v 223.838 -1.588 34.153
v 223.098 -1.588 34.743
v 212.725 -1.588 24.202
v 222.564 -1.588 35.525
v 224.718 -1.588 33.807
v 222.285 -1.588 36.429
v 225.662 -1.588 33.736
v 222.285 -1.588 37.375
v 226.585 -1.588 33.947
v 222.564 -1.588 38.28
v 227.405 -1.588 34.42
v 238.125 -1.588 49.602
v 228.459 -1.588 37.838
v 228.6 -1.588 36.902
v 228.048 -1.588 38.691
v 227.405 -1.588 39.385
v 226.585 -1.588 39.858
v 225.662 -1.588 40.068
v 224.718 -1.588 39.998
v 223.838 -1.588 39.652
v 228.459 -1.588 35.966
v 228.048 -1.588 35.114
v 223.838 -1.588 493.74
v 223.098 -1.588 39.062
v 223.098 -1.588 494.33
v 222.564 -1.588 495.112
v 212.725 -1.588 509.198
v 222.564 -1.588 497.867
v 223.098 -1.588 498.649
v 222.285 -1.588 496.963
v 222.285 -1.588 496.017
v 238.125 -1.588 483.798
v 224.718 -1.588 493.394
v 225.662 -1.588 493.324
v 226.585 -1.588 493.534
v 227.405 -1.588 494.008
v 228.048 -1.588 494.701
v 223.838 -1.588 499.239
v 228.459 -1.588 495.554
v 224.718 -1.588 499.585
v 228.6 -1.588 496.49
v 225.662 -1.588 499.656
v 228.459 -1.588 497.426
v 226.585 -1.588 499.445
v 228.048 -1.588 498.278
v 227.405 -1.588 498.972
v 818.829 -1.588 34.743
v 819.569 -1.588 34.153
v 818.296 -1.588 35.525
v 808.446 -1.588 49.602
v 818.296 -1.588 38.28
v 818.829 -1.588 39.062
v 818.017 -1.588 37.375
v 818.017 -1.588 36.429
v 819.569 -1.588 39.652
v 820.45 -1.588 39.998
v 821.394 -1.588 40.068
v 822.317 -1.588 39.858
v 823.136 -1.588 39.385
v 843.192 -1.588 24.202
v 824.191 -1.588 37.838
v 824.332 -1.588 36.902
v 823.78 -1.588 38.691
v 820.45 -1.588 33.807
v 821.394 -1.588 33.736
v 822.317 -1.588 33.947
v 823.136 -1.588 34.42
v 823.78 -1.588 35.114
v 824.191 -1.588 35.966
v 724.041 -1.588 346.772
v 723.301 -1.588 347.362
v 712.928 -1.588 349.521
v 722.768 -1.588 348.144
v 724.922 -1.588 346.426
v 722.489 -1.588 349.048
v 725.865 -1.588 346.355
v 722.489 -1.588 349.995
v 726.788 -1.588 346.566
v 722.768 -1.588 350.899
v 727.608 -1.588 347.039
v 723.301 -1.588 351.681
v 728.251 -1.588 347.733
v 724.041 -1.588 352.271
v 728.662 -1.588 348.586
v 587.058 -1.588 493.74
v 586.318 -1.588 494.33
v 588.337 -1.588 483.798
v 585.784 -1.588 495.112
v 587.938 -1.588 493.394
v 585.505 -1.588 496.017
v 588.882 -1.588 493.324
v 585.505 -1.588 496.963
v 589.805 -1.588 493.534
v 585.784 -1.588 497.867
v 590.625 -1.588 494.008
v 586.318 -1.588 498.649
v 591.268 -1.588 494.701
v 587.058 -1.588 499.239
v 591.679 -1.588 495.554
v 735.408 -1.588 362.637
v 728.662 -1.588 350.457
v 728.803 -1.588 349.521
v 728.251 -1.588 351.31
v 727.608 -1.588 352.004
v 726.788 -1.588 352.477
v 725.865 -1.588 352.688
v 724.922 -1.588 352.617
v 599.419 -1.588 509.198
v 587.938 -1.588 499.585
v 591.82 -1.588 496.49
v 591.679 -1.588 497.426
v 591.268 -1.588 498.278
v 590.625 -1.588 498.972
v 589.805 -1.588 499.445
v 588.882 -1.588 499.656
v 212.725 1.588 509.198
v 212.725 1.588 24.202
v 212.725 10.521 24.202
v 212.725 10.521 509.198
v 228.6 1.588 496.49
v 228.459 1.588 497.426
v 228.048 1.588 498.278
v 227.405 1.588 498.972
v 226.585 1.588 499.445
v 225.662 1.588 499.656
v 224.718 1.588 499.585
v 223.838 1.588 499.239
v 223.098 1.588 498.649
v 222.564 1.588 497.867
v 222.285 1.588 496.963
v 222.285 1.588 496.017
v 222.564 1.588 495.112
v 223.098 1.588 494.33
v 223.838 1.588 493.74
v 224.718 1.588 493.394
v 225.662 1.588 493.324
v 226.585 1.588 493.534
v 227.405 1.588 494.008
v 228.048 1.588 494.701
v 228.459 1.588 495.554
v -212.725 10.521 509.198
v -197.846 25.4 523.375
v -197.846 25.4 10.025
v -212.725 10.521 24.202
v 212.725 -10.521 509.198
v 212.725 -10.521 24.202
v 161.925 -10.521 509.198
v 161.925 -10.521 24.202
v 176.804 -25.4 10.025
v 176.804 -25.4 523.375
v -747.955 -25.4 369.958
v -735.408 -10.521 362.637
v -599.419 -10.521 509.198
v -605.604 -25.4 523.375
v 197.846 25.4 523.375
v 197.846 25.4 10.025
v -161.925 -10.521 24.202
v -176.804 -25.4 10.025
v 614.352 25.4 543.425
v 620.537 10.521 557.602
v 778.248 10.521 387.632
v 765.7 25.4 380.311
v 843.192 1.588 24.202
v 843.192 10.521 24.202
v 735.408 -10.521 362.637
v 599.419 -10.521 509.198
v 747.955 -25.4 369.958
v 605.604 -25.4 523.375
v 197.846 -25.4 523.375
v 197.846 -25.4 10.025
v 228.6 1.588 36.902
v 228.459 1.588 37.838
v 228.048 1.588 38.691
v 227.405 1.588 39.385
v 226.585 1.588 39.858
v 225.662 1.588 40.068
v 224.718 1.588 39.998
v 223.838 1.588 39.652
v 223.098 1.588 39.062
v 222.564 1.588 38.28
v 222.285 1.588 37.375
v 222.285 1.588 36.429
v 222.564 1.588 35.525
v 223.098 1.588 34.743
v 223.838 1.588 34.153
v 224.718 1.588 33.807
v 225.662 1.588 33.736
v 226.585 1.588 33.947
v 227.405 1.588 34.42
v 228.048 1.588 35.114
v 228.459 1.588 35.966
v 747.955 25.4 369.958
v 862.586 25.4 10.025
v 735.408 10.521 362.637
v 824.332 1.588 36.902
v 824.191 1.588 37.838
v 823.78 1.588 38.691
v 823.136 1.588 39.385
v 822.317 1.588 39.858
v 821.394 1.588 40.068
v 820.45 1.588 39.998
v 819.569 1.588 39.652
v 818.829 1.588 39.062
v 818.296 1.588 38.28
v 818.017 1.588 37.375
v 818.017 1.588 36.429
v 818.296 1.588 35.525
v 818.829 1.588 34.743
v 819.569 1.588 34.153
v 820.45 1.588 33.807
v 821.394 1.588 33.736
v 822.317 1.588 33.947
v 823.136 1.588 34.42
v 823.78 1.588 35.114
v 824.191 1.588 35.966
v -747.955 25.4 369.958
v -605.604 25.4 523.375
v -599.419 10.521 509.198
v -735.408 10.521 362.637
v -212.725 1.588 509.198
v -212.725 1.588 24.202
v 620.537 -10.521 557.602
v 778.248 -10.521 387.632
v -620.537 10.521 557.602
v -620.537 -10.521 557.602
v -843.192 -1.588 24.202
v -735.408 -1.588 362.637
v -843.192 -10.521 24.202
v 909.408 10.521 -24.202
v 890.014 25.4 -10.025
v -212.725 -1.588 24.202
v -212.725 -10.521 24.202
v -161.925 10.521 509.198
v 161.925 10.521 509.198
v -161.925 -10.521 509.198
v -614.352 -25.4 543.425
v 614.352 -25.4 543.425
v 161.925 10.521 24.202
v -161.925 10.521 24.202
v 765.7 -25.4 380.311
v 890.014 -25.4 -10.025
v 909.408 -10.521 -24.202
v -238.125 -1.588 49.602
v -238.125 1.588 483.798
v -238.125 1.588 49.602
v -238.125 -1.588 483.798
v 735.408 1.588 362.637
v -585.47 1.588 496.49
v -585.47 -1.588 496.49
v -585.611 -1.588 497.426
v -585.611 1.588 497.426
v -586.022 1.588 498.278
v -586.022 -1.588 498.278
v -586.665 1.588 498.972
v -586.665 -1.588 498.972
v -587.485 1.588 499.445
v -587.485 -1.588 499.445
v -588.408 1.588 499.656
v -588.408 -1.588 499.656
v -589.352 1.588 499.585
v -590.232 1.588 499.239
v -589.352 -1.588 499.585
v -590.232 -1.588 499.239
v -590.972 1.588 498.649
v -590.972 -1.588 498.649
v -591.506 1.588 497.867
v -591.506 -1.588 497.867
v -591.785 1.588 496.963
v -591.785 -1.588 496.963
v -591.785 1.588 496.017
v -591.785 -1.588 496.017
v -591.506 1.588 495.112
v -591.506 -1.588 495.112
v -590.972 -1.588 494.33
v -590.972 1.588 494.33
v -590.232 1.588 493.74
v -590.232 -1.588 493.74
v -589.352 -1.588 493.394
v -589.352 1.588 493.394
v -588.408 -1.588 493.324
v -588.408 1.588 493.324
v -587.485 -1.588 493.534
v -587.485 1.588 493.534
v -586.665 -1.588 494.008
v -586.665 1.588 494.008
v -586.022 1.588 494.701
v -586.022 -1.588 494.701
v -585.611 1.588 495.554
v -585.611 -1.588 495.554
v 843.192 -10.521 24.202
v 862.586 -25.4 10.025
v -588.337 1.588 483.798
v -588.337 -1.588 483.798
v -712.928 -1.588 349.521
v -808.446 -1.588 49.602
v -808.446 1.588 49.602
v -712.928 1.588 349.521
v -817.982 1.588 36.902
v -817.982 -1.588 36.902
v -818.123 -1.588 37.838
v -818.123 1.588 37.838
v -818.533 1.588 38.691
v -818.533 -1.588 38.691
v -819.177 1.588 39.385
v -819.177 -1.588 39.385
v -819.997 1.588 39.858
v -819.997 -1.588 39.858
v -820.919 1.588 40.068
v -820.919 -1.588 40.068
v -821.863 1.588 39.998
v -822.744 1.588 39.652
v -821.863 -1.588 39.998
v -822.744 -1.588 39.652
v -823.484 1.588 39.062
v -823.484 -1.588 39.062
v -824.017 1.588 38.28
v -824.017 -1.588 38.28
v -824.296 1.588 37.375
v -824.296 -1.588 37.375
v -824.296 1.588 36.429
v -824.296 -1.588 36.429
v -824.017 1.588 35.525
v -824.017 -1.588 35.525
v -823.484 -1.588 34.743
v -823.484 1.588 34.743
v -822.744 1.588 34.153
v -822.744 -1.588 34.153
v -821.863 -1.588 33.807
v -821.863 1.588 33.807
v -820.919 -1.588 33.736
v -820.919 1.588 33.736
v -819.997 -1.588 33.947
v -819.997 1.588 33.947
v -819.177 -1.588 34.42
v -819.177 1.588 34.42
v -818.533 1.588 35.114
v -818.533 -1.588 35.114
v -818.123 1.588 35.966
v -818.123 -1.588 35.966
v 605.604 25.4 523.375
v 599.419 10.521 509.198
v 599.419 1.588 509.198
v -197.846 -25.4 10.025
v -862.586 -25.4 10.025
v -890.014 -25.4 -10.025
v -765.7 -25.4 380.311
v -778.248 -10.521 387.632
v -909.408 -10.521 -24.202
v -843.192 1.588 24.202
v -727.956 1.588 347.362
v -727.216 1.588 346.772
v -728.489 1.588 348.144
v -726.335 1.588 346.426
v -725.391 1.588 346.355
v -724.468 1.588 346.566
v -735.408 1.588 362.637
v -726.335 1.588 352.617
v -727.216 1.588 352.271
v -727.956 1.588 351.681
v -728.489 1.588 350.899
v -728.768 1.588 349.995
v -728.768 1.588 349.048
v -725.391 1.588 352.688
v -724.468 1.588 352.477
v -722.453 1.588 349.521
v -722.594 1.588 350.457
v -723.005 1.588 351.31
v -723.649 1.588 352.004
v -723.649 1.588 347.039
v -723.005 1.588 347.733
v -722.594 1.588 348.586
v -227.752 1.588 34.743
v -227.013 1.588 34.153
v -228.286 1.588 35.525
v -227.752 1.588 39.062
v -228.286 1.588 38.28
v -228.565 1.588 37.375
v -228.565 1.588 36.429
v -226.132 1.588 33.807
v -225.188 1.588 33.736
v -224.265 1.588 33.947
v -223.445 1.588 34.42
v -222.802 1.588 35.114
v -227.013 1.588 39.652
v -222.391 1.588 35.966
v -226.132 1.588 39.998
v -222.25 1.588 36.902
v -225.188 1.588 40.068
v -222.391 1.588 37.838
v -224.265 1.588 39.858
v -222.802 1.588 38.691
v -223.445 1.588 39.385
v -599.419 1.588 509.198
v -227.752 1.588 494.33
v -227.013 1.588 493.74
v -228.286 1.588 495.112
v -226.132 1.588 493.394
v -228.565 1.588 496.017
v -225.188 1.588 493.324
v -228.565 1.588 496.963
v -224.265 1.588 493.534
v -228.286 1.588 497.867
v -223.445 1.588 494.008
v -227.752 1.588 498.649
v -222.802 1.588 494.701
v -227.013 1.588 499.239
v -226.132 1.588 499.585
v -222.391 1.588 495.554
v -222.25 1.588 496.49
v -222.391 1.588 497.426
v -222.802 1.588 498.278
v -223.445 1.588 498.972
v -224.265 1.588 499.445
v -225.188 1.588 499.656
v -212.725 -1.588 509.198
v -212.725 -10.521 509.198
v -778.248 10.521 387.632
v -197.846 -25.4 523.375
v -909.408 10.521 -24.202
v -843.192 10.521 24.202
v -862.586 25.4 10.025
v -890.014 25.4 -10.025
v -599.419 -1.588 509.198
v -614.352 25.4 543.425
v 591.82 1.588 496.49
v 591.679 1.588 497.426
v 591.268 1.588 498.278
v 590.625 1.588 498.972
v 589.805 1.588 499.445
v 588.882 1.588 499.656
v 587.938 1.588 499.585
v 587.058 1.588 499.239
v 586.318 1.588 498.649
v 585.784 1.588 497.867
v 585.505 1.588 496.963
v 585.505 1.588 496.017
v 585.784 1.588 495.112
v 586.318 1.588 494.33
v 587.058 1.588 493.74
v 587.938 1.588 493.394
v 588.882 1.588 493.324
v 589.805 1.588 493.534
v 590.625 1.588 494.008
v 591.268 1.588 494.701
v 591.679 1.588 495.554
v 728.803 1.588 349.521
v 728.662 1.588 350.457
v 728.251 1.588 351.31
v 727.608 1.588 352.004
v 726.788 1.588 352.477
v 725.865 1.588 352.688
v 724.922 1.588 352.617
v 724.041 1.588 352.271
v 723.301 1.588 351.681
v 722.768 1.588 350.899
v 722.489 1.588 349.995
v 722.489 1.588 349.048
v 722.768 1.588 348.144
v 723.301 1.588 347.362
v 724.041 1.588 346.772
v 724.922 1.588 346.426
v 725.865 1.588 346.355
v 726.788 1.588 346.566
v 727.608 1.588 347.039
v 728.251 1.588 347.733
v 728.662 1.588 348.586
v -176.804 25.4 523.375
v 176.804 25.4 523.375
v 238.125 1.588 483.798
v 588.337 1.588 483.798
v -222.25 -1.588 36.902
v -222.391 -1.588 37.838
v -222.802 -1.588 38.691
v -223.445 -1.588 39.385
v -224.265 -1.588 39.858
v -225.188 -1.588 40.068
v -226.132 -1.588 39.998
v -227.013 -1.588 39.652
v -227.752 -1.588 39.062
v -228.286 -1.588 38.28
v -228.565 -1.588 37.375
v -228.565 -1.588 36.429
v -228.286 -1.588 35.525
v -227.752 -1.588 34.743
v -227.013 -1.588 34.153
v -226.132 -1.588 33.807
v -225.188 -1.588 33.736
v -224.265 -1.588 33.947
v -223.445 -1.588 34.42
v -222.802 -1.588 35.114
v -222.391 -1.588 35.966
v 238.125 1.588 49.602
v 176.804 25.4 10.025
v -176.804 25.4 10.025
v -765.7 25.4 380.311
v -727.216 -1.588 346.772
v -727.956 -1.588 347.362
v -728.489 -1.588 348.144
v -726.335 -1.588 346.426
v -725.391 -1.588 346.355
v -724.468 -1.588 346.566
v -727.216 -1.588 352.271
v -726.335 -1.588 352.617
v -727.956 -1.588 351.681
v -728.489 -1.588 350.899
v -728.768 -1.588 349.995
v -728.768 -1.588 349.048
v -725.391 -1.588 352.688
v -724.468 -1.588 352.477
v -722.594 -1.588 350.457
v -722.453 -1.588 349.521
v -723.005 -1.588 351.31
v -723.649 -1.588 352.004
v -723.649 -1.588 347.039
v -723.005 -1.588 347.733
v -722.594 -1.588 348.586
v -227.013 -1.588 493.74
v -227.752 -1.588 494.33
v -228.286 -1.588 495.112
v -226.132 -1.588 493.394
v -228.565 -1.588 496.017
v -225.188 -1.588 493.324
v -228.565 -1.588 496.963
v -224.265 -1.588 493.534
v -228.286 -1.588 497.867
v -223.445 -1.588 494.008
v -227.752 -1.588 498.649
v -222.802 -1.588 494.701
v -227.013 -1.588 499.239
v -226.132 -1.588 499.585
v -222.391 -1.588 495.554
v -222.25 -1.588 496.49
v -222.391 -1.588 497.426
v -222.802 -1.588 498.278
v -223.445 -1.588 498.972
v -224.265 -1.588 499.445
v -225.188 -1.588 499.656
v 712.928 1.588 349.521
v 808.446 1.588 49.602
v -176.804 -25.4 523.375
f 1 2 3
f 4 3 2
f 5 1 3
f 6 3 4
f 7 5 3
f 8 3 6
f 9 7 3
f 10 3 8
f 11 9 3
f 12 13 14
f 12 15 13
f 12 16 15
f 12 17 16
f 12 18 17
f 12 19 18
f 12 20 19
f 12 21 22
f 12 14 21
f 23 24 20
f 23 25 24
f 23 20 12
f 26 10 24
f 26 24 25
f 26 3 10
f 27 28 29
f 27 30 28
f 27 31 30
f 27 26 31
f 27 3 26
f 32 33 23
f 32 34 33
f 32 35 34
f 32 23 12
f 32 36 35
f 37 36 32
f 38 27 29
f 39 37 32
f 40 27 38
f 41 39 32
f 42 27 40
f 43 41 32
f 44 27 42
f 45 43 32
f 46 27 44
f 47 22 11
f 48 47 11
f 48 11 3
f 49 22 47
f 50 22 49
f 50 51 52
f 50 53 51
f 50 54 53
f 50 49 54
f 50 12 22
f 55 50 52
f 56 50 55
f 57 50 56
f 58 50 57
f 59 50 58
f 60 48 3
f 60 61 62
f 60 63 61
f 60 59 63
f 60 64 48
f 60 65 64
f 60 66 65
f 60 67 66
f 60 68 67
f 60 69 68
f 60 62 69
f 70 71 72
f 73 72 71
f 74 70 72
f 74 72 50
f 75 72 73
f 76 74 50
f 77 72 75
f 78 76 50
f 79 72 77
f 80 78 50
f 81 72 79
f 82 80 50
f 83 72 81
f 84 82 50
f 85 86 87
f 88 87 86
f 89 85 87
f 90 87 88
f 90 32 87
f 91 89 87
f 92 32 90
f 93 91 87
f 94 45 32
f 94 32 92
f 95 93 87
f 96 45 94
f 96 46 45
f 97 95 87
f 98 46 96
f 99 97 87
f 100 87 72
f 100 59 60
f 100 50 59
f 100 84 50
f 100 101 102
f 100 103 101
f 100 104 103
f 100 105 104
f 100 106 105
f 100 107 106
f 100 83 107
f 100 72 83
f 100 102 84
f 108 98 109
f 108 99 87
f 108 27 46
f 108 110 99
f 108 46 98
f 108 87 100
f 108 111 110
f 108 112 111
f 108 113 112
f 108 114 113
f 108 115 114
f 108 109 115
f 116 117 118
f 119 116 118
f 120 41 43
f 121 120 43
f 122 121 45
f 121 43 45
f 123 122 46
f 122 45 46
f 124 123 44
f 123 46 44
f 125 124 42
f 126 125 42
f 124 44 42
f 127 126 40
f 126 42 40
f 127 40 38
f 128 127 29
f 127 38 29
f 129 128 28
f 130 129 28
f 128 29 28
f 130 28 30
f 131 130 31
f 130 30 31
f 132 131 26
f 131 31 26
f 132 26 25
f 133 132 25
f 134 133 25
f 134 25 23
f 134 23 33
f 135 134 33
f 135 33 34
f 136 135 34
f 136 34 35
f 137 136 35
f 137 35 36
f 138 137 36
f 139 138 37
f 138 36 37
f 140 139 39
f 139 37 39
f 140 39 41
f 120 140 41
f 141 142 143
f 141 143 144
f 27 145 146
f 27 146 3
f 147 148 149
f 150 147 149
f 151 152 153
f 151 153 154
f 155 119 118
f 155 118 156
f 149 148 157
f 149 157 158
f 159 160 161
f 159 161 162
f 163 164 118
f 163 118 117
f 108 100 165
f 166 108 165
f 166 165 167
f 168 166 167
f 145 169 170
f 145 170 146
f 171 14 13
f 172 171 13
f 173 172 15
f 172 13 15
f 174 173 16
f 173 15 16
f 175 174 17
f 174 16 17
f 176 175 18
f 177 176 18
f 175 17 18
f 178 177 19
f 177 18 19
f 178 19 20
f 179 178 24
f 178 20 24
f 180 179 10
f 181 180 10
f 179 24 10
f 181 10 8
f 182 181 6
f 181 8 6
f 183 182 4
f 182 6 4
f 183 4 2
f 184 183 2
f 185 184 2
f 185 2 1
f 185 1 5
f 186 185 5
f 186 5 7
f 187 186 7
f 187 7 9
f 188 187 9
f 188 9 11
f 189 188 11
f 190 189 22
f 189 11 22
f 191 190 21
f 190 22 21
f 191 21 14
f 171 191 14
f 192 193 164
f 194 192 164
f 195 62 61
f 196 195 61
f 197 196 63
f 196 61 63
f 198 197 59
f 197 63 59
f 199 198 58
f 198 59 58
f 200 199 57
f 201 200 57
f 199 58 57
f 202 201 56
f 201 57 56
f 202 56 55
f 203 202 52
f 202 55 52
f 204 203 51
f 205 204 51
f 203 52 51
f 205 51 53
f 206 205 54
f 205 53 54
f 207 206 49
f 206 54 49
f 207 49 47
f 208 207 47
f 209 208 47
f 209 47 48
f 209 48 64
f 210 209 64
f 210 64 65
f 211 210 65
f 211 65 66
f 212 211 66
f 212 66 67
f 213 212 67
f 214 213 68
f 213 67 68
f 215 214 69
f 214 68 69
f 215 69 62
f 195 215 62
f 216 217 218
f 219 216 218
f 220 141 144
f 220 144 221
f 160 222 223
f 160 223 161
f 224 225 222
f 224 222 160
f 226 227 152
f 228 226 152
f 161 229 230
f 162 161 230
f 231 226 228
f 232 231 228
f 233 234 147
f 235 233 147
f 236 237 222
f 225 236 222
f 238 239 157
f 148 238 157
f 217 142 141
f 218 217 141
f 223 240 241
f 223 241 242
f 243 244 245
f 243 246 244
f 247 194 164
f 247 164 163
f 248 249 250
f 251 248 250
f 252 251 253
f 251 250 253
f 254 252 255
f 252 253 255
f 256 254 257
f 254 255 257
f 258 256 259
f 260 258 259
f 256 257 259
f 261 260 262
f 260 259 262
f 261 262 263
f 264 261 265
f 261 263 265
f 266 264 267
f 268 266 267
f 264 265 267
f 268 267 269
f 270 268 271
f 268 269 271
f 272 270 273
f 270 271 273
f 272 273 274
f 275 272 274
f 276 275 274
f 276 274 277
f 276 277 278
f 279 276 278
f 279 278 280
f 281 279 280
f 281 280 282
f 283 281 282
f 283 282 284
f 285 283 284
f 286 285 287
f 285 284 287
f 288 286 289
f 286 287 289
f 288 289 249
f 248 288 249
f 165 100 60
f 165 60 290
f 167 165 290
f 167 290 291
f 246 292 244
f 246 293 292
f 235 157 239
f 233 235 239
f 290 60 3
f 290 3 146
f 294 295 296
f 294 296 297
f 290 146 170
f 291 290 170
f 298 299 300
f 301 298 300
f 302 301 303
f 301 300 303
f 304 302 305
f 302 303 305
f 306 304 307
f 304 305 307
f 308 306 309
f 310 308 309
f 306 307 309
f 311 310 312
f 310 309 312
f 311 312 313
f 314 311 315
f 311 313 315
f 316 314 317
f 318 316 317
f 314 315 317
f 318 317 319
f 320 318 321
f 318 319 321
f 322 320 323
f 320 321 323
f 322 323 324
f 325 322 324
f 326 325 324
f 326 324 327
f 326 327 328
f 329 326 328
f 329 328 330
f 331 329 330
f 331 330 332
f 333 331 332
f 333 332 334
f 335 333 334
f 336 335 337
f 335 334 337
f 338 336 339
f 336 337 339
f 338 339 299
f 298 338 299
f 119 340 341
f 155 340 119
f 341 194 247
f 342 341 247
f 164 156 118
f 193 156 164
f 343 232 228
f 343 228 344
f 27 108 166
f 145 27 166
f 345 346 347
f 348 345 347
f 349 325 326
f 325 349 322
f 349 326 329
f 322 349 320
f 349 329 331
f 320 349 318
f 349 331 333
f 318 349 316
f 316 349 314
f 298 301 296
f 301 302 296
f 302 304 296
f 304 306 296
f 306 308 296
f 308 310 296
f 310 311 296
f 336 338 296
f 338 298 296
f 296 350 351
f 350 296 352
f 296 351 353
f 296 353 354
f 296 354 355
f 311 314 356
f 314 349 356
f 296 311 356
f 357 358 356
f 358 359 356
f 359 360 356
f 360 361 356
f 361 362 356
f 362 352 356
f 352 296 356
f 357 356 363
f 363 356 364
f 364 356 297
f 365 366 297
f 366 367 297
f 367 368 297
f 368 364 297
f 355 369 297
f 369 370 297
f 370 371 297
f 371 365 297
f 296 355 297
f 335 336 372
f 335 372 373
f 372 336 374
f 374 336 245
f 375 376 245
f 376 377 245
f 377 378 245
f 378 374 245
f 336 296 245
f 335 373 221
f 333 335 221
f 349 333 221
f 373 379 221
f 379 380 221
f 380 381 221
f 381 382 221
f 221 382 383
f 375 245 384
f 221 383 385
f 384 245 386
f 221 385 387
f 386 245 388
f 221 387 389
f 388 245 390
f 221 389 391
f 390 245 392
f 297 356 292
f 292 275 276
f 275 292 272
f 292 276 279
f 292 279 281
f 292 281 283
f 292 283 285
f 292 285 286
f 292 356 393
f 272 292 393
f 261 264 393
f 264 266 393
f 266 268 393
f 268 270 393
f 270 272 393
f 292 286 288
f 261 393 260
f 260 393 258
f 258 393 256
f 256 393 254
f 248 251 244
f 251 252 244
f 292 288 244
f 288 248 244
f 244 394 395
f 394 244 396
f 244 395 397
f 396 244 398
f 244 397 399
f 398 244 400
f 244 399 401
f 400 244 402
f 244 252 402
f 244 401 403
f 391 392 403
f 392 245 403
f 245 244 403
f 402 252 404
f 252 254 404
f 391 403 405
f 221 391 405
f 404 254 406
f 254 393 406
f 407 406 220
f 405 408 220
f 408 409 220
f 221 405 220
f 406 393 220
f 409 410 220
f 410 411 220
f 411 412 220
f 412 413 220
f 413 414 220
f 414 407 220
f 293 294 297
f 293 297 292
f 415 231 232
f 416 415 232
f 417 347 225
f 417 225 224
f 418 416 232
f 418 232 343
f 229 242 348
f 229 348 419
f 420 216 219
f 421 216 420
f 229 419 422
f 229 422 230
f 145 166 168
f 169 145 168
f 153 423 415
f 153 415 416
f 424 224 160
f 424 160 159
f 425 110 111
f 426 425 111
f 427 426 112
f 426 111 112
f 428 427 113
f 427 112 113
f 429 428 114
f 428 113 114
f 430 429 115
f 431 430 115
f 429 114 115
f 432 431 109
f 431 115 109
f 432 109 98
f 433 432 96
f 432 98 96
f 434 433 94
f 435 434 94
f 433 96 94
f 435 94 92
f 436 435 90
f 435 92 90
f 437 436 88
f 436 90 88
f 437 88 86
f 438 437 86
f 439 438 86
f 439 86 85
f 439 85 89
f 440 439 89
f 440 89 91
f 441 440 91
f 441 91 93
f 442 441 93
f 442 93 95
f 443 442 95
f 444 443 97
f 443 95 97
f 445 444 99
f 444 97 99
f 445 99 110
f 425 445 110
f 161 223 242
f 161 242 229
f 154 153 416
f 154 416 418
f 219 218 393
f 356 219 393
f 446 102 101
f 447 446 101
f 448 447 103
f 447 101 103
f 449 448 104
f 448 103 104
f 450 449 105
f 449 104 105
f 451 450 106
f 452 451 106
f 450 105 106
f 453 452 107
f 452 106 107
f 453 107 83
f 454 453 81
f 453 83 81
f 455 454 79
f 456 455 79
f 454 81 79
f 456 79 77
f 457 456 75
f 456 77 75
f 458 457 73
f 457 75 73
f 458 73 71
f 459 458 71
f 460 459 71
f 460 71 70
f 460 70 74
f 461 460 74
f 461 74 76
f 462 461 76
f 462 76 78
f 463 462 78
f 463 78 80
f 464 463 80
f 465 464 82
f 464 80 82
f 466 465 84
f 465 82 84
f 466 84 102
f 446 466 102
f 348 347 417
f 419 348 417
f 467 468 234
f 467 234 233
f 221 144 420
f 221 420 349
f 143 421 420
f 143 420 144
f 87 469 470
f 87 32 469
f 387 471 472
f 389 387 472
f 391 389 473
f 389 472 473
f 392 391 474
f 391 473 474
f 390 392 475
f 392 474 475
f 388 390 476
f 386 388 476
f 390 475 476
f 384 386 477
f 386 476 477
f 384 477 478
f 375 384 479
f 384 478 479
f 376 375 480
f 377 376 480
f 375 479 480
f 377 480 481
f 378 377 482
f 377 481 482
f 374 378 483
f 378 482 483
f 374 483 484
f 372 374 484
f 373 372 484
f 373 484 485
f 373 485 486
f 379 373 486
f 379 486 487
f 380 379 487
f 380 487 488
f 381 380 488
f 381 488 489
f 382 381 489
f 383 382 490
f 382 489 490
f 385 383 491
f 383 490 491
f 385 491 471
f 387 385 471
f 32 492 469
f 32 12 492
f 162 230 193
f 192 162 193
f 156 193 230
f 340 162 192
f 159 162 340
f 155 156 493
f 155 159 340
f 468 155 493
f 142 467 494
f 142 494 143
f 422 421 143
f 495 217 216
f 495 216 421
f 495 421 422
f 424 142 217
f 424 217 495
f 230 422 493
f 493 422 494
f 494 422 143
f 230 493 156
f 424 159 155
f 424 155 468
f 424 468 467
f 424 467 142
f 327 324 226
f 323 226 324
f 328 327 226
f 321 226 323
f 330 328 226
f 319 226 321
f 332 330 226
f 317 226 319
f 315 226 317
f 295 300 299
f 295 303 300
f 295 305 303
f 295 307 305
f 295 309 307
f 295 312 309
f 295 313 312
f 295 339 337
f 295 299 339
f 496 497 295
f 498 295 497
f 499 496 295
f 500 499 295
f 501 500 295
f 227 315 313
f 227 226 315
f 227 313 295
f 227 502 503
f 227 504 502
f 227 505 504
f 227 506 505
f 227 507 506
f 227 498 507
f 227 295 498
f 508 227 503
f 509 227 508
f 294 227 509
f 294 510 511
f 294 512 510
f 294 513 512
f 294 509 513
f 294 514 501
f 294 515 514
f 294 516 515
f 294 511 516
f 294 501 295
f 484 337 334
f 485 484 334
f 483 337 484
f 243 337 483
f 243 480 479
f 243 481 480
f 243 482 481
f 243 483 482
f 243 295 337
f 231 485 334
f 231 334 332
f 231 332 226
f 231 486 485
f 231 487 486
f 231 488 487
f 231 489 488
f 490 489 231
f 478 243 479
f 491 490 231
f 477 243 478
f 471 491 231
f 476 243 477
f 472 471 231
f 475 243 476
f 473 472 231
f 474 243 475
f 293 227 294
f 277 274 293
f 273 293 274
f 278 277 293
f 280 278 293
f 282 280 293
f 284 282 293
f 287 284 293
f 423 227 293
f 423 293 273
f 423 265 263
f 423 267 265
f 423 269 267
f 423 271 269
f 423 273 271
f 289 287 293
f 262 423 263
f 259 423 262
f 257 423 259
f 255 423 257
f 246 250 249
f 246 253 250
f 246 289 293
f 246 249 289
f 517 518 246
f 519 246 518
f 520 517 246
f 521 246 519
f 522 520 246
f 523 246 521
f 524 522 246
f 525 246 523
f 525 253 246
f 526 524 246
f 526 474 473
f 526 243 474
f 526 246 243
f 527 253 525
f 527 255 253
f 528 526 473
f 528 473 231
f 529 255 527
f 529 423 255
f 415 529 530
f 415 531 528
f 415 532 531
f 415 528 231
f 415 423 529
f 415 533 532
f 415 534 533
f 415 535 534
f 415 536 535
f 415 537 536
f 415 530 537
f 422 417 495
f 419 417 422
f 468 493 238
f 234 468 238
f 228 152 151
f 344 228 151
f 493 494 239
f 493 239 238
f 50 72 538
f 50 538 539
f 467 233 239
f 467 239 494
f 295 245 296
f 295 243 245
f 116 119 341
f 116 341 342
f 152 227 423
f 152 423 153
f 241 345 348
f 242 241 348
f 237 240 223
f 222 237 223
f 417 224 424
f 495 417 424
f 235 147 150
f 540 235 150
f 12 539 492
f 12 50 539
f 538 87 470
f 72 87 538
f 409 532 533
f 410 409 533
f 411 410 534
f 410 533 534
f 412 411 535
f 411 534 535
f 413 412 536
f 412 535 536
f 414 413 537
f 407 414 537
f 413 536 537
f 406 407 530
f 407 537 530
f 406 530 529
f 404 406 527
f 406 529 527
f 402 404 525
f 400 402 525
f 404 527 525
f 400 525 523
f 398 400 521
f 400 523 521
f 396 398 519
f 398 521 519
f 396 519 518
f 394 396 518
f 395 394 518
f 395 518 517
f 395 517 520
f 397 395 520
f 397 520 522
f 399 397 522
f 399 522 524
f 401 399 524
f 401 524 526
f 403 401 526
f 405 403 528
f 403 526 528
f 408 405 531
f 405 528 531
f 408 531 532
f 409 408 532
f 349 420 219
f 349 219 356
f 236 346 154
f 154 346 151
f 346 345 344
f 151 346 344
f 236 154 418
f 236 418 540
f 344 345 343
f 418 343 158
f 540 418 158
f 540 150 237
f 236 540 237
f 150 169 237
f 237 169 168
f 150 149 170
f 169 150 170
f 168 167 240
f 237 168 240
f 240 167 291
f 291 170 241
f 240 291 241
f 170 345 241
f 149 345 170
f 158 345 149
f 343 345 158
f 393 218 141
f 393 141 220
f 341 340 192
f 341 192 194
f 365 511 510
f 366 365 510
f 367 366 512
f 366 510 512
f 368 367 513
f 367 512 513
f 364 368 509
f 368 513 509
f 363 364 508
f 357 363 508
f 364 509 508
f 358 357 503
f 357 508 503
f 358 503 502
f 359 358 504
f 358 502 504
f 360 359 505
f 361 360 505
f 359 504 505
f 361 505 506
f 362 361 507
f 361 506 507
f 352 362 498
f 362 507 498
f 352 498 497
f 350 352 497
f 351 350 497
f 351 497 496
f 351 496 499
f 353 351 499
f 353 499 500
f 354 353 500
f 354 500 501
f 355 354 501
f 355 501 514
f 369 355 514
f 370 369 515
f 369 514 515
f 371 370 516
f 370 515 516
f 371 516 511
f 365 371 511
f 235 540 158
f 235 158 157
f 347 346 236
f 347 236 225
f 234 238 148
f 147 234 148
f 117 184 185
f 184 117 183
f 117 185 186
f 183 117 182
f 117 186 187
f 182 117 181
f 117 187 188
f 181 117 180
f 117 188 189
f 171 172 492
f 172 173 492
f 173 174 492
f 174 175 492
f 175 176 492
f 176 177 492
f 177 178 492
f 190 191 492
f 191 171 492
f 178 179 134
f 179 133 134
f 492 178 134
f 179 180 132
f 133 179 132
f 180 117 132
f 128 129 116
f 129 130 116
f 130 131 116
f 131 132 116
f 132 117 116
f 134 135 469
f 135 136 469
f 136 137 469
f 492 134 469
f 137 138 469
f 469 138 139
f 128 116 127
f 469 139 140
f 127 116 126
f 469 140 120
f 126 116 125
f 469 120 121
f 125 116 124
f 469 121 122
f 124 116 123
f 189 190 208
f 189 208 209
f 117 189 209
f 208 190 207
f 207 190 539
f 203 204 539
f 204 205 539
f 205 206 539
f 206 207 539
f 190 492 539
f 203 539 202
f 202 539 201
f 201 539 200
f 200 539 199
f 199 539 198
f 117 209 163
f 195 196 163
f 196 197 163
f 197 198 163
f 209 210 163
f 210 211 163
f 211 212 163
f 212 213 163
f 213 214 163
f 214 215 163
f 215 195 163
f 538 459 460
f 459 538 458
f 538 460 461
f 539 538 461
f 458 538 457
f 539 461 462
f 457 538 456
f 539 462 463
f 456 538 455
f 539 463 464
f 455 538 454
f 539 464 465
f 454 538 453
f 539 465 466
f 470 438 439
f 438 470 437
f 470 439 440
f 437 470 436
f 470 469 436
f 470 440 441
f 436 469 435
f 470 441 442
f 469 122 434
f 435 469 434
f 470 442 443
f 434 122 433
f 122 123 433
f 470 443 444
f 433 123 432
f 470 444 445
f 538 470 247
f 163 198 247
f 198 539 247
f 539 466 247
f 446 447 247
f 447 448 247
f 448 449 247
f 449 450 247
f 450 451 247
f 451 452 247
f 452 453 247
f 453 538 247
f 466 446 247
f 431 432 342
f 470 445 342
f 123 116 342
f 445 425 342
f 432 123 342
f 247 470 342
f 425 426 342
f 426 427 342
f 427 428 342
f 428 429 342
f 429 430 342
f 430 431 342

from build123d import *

# Parameters (mm, degrees)
F7_DEPTH      = 1.5875
F7_DEPTH_BACK = 1.5875
F8_R          = 3.175
F9_DEPTH      = 3.175


with BuildPart() as f2:
    # F2: sweep along a path in F0
    with BuildLine(Plane.XZ) as f2_path:
        Line((876.3, 0), (756.8278850907, 375.134780791))
        Line((756.8278850907, 375.134780791), (609.9778582309, 533.4))
        Line((609.9778582309, 533.4), (0, 533.4))
        Line((0, 533.4), (-609.9778582309, 533.4))
        Line((-609.9778582309, 533.4), (-756.8278850907, 375.134780791))
        Line((-756.8278850907, 375.134780791), (-876.3, 0))
        Line((-876.3, 0), (0, 0))
        Line((0, 0), (876.3, 0))
    # F1 (on Top) → F2 (sweep)
    with BuildSketch(Plane.XY):
        Polygon((886.8210244843, 25.4), (865.7789755157, 25.4), (850.9, 10.5210244843), (850.9, -10.5210244843), (865.7789755157, -25.4), (886.8210244843, -25.4), (901.7, -10.5210244843), (901.7, 10.5210244843), align=None)
    sweep(path=f2_path.line, transition=Transition.RIGHT)



with BuildPart() as f4:
    # F4: sweep along a path in F0
    with BuildLine(Plane.XZ) as f4_path:
        Line((187.325, 533.4), (187.325, 0))
    # F3 (on Top) → F4 (sweep)
    with BuildSketch(Plane.XY):
        Polygon((197.8460244843, 25.4), (176.8039755157, 25.4), (161.925, 10.5210244843), (161.925, -10.5210244843), (176.8039755157, -25.4), (197.8460244843, -25.4), (212.725, -10.5210244843), (212.725, 10.5210244843), align=None)
    sweep(path=f4_path.line)


with BuildPart() as f5:
    # F5: sweep along a path in F0
    with BuildLine(Plane.XZ) as f5_path:
        Line((-187.325, 533.4), (-187.325, 0))
    # F3 (on Top) → F5 (sweep)
    with BuildSketch(Plane.XY):
        Polygon((-176.8039755157, 25.4), (-197.8460244843, 25.4), (-212.725, 10.5210244843), (-212.725, -10.5210244843), (-197.8460244843, -25.4), (-176.8039755157, -25.4), (-161.925, -10.5210244843), (-161.925, 10.5210244843), align=None)
    sweep(path=f5_path.line)


with BuildPart() as f2_1:
    add(f2.part)

    add(f4.part)  # F7 merges F4

    add(f5.part)  # F7 merges F5
    # F6 (on Front) → F7 (join, two sides)
    with BuildSketch(Plane.XZ) as f7_sk:
        Polygon((-735.4080395805, 362.6373508831), (-843.1921216188, 24.202243922), (-212.725, 24.202243922), (-212.725, 509.197756078), (-599.4185938449, 509.197756078), align=None)
        Polygon((-808.445752084, 49.602243922), (-712.9281373981, 349.5214298683), (-588.3367571247, 483.797756078), (-238.125, 483.797756078), (-238.125, 49.602243922), align=None, mode=Mode.SUBTRACT)
        Polygon((212.725, 24.202243922), (843.1921216188, 24.202243922), (735.4080395805, 362.6373508831), (599.4185938449, 509.197756078), (212.725, 509.197756078), align=None)
        Polygon((712.9281373981, 349.5214298683), (808.445752084, 49.602243922), (238.125, 49.602243922), (238.125, 483.797756078), (588.3367571247, 483.797756078), align=None, mode=Mode.SUBTRACT)
    extrude(amount=F7_DEPTH)
    extrude(f7_sk.sketch, amount=-F7_DEPTH_BACK)

    # F8 (on face) → F9 (cut, through all)
    with BuildSketch(Plane.XZ.offset(1.5875)):
        with Locations((-225.425, 36.902243922)):
            Circle(F8_R)
        with Locations((-225.425, 496.489843922)):
            Circle(F8_R)
        with Locations((-588.645, 496.489843922)):
            Circle(F8_R)
        with Locations((-725.6281373981, 349.5214298683)):
            Circle(F8_R)
        with Locations((-821.1566, 36.902243922)):
            Circle(F8_R)
        with Locations((225.425, 36.902243922)):
            Circle(F8_R)
        with Locations((225.425, 496.489843922)):
            Circle(F8_R)
        with Locations((588.645, 496.489843922)):
            Circle(F8_R)
        with Locations((725.6281373981, 349.5214298683)):
            Circle(F8_R)
        with Locations((821.1566, 36.902243922)):
            Circle(F8_R)
    extrude(amount=-F9_DEPTH, mode=Mode.SUBTRACT)


solid = f2_1.part
